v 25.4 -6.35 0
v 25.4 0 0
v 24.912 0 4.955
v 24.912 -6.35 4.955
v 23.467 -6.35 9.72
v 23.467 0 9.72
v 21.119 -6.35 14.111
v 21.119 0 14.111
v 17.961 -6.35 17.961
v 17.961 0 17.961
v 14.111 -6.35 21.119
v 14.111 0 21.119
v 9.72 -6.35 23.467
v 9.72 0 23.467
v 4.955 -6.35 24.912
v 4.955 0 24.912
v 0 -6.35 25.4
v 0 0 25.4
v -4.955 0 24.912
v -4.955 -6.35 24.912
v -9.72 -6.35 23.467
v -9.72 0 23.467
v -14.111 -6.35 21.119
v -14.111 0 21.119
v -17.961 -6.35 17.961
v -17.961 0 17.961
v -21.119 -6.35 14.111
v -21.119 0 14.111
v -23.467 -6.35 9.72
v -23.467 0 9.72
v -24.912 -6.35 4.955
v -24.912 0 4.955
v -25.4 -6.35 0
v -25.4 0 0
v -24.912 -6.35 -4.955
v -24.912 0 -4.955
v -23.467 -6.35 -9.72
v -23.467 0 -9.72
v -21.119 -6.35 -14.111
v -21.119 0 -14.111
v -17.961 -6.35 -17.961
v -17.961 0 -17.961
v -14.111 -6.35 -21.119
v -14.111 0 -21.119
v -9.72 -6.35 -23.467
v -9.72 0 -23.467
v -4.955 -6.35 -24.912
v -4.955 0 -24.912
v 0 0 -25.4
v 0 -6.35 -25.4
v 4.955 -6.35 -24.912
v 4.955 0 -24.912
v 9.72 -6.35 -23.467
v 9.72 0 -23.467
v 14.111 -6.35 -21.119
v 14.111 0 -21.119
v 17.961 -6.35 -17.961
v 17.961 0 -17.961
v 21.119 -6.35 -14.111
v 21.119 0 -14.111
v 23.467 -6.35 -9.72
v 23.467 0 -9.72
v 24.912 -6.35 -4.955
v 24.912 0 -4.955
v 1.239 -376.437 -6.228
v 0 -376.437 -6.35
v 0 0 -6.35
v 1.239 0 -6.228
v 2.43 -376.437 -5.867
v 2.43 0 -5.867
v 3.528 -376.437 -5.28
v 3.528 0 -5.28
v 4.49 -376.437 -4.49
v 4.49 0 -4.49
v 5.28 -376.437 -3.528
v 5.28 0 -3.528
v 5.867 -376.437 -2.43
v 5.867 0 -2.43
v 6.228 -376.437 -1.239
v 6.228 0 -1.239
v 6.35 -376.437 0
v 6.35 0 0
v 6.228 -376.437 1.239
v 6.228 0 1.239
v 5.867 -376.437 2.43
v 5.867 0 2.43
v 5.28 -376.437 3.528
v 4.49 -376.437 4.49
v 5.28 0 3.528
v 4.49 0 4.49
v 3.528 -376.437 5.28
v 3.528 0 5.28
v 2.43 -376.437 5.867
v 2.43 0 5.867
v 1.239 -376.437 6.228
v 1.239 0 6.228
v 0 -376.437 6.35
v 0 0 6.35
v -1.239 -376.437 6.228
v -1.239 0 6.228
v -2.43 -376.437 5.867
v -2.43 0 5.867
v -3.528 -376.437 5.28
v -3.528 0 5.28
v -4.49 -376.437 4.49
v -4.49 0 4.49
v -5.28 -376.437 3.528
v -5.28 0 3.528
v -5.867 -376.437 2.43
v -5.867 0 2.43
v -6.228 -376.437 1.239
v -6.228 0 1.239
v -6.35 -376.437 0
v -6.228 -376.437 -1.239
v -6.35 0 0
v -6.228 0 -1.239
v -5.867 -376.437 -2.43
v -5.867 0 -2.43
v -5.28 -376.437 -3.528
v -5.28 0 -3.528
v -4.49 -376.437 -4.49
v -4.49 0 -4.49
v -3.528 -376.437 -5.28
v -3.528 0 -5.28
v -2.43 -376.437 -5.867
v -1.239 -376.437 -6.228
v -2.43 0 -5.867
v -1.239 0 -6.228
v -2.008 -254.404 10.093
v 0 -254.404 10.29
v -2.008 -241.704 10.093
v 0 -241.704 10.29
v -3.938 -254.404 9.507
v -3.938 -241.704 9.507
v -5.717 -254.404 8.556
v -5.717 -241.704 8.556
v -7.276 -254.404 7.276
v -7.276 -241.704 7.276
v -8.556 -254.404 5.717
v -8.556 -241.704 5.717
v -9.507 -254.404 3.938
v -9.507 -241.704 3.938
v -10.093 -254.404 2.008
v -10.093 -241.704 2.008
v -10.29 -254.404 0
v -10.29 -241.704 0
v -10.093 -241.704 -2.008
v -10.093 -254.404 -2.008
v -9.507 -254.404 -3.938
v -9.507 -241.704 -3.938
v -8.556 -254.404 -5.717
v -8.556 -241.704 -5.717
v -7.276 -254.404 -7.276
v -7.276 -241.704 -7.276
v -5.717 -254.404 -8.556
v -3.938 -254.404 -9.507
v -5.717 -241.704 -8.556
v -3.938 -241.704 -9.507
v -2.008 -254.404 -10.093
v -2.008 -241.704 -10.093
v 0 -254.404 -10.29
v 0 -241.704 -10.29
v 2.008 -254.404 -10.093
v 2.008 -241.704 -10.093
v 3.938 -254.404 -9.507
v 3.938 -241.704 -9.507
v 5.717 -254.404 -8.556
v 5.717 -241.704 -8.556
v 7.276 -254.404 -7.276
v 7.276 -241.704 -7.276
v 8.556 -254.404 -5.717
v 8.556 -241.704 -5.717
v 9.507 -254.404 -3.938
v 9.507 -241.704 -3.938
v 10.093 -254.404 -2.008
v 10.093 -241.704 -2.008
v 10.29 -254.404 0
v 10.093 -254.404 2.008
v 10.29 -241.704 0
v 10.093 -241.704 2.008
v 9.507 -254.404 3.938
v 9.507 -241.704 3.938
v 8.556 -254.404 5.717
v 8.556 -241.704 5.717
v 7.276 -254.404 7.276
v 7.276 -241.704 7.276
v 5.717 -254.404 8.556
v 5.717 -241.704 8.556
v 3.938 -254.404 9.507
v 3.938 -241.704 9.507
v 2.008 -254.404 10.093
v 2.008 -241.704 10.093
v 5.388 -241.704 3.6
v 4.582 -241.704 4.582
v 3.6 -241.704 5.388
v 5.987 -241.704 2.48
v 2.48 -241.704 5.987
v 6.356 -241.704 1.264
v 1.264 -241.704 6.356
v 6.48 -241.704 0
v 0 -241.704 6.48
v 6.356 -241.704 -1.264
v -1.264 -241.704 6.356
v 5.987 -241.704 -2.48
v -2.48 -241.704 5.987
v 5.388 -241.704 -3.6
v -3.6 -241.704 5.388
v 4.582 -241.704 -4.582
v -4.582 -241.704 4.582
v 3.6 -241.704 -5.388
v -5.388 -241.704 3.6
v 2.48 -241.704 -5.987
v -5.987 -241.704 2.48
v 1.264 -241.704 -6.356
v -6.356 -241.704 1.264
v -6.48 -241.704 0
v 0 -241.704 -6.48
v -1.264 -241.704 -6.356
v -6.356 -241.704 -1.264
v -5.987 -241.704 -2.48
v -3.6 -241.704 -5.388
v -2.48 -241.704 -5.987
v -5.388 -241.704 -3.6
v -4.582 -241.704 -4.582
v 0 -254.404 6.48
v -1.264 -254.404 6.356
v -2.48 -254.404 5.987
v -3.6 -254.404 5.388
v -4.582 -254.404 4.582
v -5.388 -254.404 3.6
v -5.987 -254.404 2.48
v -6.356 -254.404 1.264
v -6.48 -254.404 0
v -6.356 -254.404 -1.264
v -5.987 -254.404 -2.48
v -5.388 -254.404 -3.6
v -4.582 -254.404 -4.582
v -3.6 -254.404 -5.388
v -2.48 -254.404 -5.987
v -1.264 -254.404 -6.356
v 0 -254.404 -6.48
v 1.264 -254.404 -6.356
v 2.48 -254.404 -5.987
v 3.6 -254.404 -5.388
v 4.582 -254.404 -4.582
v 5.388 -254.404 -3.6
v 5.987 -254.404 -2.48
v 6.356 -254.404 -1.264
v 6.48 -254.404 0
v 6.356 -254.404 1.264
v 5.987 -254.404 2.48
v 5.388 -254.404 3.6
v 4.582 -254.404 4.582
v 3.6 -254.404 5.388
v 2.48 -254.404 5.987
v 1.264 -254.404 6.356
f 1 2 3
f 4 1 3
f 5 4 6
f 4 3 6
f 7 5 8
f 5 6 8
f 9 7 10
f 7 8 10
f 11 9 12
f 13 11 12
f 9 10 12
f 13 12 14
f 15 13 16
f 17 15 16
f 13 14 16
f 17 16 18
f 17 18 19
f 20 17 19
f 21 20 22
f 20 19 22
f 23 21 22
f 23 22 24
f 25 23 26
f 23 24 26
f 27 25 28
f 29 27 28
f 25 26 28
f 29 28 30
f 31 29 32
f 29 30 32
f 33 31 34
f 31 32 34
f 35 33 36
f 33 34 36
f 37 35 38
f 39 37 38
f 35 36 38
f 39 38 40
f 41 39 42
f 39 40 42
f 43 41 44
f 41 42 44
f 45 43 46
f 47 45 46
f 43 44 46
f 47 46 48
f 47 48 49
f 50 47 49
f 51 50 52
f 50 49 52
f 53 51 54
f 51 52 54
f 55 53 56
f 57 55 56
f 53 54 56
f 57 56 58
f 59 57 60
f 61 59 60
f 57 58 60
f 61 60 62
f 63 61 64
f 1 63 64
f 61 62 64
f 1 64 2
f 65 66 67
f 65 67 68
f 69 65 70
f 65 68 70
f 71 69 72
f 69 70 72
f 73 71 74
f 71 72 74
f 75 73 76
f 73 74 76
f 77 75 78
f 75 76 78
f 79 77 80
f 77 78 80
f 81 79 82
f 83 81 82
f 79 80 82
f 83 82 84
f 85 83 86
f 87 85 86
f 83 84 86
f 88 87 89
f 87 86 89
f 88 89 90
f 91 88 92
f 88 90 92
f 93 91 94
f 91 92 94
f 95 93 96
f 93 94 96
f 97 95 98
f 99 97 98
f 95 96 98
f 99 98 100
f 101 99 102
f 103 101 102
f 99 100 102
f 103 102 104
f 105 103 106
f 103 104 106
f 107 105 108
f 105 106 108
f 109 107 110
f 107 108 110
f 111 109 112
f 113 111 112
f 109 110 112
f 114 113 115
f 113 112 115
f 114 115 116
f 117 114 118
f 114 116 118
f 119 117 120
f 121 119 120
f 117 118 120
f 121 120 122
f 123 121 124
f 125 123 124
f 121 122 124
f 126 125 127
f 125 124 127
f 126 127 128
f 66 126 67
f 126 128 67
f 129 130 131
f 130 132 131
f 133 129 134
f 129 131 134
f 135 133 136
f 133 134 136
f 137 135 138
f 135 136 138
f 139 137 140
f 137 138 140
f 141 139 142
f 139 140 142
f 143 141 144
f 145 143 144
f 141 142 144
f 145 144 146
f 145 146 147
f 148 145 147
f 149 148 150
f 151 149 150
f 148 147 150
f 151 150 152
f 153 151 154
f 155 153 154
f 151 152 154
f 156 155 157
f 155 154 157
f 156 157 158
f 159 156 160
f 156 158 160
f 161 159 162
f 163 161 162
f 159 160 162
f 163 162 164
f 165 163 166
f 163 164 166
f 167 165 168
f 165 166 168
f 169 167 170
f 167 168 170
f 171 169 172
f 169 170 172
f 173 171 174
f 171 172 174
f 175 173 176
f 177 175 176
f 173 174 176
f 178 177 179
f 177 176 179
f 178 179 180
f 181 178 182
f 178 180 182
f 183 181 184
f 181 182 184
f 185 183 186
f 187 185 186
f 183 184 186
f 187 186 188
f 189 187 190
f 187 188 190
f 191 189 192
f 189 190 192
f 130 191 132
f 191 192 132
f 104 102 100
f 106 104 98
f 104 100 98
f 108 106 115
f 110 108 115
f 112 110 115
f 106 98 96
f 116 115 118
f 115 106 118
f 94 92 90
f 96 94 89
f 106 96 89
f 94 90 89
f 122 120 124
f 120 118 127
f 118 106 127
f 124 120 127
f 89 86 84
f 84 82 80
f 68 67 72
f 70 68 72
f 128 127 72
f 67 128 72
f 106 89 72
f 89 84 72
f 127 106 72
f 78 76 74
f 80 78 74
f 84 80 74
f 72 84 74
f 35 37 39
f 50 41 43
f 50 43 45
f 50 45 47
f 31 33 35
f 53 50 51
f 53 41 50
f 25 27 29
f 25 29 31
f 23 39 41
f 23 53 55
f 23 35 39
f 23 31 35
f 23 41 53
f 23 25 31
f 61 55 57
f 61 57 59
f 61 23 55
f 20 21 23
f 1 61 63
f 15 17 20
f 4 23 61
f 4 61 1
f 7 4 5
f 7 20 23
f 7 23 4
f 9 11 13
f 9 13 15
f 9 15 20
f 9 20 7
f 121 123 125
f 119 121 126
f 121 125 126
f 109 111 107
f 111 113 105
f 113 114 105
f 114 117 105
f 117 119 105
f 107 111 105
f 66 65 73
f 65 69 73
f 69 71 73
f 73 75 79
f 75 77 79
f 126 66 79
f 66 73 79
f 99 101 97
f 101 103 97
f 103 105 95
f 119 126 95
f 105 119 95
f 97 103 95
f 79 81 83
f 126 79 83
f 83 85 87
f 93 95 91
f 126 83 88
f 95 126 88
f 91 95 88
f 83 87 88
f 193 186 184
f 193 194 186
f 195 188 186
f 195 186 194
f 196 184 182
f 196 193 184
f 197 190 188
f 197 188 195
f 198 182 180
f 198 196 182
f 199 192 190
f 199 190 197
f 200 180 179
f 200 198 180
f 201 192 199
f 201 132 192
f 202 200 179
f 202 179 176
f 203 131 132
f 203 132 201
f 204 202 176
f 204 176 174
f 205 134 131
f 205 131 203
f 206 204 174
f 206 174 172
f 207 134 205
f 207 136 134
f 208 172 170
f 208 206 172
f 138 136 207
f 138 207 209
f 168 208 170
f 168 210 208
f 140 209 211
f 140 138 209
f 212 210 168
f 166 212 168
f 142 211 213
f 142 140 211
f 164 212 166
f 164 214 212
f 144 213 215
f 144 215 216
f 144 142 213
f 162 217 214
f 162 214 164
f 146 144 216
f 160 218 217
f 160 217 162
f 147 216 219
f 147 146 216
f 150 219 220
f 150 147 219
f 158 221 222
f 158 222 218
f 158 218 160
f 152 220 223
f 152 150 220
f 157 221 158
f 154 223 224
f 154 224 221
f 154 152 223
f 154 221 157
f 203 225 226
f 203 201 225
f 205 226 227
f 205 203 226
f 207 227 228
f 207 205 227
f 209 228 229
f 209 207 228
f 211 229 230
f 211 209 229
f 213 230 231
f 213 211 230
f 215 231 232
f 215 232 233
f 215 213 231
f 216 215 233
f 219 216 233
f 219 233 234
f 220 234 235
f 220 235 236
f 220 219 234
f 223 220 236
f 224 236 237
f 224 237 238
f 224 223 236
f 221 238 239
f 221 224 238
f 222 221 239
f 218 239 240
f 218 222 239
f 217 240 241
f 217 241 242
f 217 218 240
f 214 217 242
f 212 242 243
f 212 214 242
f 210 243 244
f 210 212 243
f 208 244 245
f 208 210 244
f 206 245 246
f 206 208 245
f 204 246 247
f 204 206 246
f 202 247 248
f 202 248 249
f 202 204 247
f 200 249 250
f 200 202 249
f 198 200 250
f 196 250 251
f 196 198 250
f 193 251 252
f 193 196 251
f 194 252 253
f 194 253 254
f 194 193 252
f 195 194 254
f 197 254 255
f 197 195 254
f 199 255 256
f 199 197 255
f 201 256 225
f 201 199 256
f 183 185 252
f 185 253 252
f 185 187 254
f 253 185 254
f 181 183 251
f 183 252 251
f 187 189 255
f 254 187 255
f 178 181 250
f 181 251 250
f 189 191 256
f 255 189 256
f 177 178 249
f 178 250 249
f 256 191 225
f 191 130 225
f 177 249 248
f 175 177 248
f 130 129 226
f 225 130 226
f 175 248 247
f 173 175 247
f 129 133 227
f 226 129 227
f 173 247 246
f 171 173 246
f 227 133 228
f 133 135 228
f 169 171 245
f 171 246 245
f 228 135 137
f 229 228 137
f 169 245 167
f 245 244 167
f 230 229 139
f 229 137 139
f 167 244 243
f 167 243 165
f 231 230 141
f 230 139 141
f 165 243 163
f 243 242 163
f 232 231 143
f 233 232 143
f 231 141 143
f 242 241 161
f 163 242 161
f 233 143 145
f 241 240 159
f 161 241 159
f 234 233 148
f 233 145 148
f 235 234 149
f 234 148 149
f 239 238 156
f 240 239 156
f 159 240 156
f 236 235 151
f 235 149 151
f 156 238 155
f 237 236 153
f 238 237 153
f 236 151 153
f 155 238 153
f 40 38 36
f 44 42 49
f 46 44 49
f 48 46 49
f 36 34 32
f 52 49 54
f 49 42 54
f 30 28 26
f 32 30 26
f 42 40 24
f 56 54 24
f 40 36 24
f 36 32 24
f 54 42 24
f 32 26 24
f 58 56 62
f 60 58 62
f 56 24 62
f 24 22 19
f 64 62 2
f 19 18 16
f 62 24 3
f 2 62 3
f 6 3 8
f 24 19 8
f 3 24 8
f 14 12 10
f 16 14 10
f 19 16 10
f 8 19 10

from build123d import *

# Parameters (mm, degrees)
F2_R     = 25.4
F3_DEPTH = 6.35
F4_W     = 12.7
F4_H     = 3.81


with BuildPart() as f1:
    # F0 (on Right) → F1 (revolve)
    with BuildSketch(Plane.YZ):
        Polygon((0, -6.35), (0, 0), (-304.8, 0), (-376.4366805553, 0), (-376.4366805553, -6.35), (-304.8, -6.35), align=None)
    revolve(axis=Axis((0, -152.4, 0), (0, -1, 0)))


with BuildPart() as f3:
    # F2 (on Front) → F3 (new body)
    with BuildSketch(Plane.XZ):
        Circle(F2_R)
    extrude(amount=F3_DEPTH)


with BuildPart() as f5:
    # F4 (on Right) → F5 (revolve)
    with BuildSketch(Plane.YZ):
        with Locations((-248.0537518859, 8.3854413971)):
            Rectangle(F4_W, F4_H)
    revolve(axis=Axis((0, -152.4, 0), (0, -1, 0)))


solid = Compound([f1.part, f3.part, f5.part])
